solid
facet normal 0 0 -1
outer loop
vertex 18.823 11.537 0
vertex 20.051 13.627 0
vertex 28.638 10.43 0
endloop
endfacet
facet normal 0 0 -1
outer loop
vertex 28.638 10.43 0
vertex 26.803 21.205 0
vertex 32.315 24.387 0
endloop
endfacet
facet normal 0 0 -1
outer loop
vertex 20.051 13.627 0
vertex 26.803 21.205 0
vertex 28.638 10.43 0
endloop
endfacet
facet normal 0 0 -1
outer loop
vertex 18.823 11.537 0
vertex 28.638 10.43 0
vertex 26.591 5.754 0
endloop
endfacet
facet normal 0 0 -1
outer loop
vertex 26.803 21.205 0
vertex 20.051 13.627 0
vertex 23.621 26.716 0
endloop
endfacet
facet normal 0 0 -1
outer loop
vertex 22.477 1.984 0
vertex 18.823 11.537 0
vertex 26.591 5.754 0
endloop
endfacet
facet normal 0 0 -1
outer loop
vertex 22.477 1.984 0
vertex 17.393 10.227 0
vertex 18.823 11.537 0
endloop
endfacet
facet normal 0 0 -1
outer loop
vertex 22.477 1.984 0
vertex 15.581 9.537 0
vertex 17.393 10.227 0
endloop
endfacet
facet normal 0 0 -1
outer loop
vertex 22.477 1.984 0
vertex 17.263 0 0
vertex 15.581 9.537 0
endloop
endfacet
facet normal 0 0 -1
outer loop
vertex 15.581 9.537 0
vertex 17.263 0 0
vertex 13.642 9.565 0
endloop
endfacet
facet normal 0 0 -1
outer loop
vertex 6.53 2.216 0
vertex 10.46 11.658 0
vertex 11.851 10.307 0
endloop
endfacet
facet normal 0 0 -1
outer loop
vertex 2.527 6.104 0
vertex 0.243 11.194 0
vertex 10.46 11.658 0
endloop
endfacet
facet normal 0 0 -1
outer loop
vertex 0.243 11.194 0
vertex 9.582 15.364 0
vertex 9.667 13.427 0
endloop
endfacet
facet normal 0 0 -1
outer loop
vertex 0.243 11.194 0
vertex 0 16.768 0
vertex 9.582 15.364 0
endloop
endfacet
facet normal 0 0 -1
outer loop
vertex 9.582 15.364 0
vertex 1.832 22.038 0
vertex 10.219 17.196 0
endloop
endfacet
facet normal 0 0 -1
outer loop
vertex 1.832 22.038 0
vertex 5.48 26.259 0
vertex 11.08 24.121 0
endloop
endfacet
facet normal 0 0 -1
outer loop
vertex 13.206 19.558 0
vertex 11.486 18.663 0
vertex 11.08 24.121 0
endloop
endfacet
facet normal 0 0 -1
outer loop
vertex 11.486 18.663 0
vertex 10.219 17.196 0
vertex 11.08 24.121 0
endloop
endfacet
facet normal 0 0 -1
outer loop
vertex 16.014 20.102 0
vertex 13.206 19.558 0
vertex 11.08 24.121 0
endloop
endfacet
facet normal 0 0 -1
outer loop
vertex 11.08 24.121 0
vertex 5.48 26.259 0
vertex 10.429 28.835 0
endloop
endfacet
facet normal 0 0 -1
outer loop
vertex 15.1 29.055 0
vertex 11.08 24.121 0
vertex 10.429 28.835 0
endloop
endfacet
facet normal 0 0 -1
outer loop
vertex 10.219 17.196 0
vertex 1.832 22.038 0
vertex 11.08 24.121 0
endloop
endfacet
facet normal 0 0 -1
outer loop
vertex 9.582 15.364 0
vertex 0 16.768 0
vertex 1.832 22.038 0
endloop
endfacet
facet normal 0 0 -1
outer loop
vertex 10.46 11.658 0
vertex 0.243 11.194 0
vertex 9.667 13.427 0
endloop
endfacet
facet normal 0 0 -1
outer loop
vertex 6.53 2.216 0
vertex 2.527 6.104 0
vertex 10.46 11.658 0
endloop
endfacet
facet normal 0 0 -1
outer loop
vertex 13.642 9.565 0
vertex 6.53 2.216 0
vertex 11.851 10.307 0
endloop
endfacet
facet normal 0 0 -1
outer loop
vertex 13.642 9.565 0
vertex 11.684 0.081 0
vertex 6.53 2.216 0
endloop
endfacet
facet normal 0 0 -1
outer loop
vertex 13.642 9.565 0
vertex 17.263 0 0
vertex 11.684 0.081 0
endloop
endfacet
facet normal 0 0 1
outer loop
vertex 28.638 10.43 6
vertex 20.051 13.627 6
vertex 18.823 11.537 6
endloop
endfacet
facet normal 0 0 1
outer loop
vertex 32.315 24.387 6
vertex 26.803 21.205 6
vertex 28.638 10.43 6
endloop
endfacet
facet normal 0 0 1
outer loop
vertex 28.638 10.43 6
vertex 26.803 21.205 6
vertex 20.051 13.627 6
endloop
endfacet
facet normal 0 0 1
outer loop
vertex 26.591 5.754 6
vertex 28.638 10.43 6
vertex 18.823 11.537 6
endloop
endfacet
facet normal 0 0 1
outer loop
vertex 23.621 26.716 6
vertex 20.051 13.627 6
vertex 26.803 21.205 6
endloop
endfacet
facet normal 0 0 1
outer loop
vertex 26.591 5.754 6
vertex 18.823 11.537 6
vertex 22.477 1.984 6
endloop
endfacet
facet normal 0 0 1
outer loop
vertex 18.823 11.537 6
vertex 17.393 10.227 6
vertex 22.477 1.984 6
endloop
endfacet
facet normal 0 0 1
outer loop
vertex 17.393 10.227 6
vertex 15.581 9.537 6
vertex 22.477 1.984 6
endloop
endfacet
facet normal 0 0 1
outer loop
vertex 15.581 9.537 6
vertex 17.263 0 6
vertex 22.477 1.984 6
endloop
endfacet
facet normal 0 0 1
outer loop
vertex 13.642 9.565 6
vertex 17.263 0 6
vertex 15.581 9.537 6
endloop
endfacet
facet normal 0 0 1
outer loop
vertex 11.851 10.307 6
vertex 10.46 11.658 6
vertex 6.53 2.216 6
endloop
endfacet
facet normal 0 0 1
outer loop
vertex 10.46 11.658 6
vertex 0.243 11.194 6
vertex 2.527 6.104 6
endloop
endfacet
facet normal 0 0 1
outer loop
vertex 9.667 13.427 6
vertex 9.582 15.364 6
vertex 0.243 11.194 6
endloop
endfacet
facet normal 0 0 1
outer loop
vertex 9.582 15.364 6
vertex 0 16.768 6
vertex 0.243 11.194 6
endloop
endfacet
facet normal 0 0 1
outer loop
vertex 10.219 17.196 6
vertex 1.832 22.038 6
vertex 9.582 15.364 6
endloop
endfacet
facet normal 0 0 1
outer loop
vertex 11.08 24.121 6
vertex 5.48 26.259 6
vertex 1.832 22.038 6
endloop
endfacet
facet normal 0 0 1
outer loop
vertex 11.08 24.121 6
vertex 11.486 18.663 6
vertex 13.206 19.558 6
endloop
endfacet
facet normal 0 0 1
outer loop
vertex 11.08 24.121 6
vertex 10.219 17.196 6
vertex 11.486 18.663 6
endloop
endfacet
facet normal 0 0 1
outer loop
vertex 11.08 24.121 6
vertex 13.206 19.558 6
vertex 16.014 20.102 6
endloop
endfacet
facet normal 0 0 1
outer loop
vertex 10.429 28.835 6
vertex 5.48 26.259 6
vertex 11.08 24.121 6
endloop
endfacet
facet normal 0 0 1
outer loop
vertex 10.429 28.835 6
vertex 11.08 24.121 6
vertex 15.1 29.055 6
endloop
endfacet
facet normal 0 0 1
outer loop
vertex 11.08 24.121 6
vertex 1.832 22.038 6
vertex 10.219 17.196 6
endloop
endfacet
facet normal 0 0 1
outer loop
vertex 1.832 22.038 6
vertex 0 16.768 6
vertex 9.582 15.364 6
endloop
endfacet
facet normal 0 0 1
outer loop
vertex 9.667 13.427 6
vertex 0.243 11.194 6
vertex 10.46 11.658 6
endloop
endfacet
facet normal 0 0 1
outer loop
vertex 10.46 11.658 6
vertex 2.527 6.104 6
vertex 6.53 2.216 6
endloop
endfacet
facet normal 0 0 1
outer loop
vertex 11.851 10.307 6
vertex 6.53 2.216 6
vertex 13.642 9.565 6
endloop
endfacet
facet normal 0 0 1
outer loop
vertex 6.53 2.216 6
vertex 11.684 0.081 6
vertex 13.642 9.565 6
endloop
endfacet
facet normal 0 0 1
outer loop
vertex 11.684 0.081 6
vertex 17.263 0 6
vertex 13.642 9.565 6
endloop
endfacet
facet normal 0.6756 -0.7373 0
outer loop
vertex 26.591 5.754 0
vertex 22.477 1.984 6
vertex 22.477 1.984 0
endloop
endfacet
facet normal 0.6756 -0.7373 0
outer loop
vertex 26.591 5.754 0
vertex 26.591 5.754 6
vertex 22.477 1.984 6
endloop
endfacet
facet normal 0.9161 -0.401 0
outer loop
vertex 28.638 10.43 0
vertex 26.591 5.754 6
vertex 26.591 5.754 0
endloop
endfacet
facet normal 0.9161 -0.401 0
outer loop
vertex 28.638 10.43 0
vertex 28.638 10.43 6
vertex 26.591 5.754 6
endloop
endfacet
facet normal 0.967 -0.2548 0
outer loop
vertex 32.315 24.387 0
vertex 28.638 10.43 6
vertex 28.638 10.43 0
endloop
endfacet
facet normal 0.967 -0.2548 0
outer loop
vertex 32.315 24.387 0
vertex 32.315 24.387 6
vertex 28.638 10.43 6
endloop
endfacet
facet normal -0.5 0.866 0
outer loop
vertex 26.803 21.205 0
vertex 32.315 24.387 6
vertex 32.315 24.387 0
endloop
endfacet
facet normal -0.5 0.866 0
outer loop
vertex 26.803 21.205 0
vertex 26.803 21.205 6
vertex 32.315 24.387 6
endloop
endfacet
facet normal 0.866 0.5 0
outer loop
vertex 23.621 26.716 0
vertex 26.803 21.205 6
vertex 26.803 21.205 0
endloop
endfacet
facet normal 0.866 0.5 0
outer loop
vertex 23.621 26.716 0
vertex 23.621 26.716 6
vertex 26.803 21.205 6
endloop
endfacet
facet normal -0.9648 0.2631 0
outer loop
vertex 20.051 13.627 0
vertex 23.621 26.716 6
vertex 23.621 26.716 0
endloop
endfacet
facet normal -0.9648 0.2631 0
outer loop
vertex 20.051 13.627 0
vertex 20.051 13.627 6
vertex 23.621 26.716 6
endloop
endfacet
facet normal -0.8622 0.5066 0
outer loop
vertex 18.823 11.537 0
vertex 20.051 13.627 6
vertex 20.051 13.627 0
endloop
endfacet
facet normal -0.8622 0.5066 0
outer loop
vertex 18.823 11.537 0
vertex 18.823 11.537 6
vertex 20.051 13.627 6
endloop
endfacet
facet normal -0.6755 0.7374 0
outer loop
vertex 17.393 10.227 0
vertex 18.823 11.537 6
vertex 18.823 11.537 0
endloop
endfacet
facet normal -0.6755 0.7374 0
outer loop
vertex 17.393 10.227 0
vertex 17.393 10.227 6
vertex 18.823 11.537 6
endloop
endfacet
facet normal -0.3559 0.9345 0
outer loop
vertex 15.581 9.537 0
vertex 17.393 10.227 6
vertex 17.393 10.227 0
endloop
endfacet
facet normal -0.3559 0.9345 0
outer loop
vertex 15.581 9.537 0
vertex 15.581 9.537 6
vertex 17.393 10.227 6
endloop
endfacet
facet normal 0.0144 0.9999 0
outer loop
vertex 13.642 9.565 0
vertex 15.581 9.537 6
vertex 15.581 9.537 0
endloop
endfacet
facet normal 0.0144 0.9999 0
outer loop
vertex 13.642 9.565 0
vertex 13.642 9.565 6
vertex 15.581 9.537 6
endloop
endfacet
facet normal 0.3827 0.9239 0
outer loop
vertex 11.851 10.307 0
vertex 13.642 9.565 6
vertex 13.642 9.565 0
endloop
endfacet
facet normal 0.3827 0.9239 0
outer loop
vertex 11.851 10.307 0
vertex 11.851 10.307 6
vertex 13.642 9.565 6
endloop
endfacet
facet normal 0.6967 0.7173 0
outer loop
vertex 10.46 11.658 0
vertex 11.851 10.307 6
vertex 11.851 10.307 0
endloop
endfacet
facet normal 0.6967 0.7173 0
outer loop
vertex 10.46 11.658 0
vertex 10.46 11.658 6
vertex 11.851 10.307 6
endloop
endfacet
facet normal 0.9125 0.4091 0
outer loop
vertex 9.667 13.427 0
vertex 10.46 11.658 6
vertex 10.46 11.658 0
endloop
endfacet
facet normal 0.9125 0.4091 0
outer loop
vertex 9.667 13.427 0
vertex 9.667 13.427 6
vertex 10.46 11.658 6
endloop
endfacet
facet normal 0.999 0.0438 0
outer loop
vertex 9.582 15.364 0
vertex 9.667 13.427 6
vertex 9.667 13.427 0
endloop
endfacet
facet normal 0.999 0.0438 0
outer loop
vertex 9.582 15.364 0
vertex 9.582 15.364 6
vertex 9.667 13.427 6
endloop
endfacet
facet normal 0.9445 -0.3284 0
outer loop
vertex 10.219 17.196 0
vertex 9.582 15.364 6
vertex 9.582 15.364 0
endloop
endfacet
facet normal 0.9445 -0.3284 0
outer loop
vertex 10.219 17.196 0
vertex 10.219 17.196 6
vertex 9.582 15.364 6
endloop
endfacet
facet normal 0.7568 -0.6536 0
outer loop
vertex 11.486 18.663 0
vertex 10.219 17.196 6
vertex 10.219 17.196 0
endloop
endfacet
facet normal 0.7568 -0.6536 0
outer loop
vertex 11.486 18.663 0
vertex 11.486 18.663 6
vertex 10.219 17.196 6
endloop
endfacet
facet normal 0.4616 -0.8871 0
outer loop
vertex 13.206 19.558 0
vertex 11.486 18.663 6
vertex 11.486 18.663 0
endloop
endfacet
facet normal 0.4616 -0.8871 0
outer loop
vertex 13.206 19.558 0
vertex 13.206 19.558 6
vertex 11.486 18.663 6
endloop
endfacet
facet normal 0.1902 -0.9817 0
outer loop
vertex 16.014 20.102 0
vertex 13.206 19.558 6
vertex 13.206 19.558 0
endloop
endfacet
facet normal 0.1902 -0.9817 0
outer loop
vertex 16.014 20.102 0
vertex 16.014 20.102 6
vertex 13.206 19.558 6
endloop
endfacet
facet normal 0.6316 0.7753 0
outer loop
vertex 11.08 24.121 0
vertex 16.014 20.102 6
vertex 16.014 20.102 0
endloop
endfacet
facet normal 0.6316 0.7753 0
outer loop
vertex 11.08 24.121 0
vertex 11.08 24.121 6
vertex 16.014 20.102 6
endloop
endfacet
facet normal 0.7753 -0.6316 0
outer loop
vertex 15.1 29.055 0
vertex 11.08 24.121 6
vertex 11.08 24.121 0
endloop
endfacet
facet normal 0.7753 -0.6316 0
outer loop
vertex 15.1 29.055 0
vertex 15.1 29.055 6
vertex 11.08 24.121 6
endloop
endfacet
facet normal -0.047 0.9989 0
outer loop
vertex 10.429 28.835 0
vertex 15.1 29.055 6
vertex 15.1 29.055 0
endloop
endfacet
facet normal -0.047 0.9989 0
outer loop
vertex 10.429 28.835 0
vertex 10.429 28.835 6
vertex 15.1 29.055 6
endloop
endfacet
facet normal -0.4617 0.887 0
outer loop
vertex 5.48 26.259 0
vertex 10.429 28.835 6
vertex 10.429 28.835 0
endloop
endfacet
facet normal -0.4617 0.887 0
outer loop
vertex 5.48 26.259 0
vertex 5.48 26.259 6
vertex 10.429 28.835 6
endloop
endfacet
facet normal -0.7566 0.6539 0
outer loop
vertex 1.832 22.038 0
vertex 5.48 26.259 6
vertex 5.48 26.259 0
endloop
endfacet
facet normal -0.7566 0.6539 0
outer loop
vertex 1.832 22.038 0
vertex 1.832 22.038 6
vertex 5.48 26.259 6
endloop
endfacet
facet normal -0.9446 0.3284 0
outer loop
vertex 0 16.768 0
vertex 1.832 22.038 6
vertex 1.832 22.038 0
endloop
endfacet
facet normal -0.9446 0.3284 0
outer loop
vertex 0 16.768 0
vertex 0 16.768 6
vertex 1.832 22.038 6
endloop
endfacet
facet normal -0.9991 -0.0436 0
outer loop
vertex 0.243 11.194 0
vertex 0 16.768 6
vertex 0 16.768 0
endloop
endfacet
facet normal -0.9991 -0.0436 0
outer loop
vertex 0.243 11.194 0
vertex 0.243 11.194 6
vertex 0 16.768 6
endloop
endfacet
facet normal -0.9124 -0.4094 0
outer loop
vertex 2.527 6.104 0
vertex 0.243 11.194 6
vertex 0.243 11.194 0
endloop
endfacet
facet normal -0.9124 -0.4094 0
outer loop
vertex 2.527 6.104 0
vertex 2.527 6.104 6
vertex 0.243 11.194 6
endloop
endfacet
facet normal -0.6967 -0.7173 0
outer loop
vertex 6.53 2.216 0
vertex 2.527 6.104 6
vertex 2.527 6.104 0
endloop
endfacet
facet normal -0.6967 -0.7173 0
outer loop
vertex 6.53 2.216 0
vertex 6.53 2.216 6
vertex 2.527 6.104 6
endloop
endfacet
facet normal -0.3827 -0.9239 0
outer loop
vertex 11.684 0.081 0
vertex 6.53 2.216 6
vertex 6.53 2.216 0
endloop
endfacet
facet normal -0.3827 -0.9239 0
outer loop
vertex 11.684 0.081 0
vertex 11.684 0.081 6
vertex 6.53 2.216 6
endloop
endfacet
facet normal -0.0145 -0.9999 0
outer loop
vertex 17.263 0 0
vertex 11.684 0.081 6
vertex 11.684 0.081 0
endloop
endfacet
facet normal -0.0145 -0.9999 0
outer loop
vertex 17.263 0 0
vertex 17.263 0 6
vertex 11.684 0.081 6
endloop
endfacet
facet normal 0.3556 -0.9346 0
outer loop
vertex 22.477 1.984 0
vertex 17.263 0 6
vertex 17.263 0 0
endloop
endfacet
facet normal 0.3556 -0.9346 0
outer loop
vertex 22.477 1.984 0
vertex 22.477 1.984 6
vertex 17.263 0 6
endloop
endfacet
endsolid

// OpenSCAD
$fn = 32;

// ----------------------------------------------------------------------
// Eye lug: ring_tail, 6 mm thick
// ----------------------------------------------------------------------

// --- parameters (mm) ---
profile_height = 6;       // extrusion height
profile_points = 30;      // points of the closed outline

profile = [[11.08, 24.121], [15.1, 29.055], [10.429, 28.835], [5.48, 26.259], [1.832, 22.038], [0, 16.768], [0.243, 11.194], [2.527, 6.104], [6.53, 2.216], [11.684, 0.081], [17.263, 0], [22.477, 1.984], [26.591, 5.754], [28.638, 10.43], [32.315, 24.387], [26.803, 21.205], [23.621, 26.716], [20.051, 13.627], [18.823, 11.537], [17.393, 10.227], [15.581, 9.537], [13.642, 9.565], [11.851, 10.307], [10.46, 11.658], [9.667, 13.427], [9.582, 15.364], [10.219, 17.196], [11.486, 18.663], [13.206, 19.558], [16.014, 20.102]];  // single closed polygon, 30 points, counter clockwise

// --- the one profile operation ---
linear_extrude(height = profile_height) polygon(points = profile);
